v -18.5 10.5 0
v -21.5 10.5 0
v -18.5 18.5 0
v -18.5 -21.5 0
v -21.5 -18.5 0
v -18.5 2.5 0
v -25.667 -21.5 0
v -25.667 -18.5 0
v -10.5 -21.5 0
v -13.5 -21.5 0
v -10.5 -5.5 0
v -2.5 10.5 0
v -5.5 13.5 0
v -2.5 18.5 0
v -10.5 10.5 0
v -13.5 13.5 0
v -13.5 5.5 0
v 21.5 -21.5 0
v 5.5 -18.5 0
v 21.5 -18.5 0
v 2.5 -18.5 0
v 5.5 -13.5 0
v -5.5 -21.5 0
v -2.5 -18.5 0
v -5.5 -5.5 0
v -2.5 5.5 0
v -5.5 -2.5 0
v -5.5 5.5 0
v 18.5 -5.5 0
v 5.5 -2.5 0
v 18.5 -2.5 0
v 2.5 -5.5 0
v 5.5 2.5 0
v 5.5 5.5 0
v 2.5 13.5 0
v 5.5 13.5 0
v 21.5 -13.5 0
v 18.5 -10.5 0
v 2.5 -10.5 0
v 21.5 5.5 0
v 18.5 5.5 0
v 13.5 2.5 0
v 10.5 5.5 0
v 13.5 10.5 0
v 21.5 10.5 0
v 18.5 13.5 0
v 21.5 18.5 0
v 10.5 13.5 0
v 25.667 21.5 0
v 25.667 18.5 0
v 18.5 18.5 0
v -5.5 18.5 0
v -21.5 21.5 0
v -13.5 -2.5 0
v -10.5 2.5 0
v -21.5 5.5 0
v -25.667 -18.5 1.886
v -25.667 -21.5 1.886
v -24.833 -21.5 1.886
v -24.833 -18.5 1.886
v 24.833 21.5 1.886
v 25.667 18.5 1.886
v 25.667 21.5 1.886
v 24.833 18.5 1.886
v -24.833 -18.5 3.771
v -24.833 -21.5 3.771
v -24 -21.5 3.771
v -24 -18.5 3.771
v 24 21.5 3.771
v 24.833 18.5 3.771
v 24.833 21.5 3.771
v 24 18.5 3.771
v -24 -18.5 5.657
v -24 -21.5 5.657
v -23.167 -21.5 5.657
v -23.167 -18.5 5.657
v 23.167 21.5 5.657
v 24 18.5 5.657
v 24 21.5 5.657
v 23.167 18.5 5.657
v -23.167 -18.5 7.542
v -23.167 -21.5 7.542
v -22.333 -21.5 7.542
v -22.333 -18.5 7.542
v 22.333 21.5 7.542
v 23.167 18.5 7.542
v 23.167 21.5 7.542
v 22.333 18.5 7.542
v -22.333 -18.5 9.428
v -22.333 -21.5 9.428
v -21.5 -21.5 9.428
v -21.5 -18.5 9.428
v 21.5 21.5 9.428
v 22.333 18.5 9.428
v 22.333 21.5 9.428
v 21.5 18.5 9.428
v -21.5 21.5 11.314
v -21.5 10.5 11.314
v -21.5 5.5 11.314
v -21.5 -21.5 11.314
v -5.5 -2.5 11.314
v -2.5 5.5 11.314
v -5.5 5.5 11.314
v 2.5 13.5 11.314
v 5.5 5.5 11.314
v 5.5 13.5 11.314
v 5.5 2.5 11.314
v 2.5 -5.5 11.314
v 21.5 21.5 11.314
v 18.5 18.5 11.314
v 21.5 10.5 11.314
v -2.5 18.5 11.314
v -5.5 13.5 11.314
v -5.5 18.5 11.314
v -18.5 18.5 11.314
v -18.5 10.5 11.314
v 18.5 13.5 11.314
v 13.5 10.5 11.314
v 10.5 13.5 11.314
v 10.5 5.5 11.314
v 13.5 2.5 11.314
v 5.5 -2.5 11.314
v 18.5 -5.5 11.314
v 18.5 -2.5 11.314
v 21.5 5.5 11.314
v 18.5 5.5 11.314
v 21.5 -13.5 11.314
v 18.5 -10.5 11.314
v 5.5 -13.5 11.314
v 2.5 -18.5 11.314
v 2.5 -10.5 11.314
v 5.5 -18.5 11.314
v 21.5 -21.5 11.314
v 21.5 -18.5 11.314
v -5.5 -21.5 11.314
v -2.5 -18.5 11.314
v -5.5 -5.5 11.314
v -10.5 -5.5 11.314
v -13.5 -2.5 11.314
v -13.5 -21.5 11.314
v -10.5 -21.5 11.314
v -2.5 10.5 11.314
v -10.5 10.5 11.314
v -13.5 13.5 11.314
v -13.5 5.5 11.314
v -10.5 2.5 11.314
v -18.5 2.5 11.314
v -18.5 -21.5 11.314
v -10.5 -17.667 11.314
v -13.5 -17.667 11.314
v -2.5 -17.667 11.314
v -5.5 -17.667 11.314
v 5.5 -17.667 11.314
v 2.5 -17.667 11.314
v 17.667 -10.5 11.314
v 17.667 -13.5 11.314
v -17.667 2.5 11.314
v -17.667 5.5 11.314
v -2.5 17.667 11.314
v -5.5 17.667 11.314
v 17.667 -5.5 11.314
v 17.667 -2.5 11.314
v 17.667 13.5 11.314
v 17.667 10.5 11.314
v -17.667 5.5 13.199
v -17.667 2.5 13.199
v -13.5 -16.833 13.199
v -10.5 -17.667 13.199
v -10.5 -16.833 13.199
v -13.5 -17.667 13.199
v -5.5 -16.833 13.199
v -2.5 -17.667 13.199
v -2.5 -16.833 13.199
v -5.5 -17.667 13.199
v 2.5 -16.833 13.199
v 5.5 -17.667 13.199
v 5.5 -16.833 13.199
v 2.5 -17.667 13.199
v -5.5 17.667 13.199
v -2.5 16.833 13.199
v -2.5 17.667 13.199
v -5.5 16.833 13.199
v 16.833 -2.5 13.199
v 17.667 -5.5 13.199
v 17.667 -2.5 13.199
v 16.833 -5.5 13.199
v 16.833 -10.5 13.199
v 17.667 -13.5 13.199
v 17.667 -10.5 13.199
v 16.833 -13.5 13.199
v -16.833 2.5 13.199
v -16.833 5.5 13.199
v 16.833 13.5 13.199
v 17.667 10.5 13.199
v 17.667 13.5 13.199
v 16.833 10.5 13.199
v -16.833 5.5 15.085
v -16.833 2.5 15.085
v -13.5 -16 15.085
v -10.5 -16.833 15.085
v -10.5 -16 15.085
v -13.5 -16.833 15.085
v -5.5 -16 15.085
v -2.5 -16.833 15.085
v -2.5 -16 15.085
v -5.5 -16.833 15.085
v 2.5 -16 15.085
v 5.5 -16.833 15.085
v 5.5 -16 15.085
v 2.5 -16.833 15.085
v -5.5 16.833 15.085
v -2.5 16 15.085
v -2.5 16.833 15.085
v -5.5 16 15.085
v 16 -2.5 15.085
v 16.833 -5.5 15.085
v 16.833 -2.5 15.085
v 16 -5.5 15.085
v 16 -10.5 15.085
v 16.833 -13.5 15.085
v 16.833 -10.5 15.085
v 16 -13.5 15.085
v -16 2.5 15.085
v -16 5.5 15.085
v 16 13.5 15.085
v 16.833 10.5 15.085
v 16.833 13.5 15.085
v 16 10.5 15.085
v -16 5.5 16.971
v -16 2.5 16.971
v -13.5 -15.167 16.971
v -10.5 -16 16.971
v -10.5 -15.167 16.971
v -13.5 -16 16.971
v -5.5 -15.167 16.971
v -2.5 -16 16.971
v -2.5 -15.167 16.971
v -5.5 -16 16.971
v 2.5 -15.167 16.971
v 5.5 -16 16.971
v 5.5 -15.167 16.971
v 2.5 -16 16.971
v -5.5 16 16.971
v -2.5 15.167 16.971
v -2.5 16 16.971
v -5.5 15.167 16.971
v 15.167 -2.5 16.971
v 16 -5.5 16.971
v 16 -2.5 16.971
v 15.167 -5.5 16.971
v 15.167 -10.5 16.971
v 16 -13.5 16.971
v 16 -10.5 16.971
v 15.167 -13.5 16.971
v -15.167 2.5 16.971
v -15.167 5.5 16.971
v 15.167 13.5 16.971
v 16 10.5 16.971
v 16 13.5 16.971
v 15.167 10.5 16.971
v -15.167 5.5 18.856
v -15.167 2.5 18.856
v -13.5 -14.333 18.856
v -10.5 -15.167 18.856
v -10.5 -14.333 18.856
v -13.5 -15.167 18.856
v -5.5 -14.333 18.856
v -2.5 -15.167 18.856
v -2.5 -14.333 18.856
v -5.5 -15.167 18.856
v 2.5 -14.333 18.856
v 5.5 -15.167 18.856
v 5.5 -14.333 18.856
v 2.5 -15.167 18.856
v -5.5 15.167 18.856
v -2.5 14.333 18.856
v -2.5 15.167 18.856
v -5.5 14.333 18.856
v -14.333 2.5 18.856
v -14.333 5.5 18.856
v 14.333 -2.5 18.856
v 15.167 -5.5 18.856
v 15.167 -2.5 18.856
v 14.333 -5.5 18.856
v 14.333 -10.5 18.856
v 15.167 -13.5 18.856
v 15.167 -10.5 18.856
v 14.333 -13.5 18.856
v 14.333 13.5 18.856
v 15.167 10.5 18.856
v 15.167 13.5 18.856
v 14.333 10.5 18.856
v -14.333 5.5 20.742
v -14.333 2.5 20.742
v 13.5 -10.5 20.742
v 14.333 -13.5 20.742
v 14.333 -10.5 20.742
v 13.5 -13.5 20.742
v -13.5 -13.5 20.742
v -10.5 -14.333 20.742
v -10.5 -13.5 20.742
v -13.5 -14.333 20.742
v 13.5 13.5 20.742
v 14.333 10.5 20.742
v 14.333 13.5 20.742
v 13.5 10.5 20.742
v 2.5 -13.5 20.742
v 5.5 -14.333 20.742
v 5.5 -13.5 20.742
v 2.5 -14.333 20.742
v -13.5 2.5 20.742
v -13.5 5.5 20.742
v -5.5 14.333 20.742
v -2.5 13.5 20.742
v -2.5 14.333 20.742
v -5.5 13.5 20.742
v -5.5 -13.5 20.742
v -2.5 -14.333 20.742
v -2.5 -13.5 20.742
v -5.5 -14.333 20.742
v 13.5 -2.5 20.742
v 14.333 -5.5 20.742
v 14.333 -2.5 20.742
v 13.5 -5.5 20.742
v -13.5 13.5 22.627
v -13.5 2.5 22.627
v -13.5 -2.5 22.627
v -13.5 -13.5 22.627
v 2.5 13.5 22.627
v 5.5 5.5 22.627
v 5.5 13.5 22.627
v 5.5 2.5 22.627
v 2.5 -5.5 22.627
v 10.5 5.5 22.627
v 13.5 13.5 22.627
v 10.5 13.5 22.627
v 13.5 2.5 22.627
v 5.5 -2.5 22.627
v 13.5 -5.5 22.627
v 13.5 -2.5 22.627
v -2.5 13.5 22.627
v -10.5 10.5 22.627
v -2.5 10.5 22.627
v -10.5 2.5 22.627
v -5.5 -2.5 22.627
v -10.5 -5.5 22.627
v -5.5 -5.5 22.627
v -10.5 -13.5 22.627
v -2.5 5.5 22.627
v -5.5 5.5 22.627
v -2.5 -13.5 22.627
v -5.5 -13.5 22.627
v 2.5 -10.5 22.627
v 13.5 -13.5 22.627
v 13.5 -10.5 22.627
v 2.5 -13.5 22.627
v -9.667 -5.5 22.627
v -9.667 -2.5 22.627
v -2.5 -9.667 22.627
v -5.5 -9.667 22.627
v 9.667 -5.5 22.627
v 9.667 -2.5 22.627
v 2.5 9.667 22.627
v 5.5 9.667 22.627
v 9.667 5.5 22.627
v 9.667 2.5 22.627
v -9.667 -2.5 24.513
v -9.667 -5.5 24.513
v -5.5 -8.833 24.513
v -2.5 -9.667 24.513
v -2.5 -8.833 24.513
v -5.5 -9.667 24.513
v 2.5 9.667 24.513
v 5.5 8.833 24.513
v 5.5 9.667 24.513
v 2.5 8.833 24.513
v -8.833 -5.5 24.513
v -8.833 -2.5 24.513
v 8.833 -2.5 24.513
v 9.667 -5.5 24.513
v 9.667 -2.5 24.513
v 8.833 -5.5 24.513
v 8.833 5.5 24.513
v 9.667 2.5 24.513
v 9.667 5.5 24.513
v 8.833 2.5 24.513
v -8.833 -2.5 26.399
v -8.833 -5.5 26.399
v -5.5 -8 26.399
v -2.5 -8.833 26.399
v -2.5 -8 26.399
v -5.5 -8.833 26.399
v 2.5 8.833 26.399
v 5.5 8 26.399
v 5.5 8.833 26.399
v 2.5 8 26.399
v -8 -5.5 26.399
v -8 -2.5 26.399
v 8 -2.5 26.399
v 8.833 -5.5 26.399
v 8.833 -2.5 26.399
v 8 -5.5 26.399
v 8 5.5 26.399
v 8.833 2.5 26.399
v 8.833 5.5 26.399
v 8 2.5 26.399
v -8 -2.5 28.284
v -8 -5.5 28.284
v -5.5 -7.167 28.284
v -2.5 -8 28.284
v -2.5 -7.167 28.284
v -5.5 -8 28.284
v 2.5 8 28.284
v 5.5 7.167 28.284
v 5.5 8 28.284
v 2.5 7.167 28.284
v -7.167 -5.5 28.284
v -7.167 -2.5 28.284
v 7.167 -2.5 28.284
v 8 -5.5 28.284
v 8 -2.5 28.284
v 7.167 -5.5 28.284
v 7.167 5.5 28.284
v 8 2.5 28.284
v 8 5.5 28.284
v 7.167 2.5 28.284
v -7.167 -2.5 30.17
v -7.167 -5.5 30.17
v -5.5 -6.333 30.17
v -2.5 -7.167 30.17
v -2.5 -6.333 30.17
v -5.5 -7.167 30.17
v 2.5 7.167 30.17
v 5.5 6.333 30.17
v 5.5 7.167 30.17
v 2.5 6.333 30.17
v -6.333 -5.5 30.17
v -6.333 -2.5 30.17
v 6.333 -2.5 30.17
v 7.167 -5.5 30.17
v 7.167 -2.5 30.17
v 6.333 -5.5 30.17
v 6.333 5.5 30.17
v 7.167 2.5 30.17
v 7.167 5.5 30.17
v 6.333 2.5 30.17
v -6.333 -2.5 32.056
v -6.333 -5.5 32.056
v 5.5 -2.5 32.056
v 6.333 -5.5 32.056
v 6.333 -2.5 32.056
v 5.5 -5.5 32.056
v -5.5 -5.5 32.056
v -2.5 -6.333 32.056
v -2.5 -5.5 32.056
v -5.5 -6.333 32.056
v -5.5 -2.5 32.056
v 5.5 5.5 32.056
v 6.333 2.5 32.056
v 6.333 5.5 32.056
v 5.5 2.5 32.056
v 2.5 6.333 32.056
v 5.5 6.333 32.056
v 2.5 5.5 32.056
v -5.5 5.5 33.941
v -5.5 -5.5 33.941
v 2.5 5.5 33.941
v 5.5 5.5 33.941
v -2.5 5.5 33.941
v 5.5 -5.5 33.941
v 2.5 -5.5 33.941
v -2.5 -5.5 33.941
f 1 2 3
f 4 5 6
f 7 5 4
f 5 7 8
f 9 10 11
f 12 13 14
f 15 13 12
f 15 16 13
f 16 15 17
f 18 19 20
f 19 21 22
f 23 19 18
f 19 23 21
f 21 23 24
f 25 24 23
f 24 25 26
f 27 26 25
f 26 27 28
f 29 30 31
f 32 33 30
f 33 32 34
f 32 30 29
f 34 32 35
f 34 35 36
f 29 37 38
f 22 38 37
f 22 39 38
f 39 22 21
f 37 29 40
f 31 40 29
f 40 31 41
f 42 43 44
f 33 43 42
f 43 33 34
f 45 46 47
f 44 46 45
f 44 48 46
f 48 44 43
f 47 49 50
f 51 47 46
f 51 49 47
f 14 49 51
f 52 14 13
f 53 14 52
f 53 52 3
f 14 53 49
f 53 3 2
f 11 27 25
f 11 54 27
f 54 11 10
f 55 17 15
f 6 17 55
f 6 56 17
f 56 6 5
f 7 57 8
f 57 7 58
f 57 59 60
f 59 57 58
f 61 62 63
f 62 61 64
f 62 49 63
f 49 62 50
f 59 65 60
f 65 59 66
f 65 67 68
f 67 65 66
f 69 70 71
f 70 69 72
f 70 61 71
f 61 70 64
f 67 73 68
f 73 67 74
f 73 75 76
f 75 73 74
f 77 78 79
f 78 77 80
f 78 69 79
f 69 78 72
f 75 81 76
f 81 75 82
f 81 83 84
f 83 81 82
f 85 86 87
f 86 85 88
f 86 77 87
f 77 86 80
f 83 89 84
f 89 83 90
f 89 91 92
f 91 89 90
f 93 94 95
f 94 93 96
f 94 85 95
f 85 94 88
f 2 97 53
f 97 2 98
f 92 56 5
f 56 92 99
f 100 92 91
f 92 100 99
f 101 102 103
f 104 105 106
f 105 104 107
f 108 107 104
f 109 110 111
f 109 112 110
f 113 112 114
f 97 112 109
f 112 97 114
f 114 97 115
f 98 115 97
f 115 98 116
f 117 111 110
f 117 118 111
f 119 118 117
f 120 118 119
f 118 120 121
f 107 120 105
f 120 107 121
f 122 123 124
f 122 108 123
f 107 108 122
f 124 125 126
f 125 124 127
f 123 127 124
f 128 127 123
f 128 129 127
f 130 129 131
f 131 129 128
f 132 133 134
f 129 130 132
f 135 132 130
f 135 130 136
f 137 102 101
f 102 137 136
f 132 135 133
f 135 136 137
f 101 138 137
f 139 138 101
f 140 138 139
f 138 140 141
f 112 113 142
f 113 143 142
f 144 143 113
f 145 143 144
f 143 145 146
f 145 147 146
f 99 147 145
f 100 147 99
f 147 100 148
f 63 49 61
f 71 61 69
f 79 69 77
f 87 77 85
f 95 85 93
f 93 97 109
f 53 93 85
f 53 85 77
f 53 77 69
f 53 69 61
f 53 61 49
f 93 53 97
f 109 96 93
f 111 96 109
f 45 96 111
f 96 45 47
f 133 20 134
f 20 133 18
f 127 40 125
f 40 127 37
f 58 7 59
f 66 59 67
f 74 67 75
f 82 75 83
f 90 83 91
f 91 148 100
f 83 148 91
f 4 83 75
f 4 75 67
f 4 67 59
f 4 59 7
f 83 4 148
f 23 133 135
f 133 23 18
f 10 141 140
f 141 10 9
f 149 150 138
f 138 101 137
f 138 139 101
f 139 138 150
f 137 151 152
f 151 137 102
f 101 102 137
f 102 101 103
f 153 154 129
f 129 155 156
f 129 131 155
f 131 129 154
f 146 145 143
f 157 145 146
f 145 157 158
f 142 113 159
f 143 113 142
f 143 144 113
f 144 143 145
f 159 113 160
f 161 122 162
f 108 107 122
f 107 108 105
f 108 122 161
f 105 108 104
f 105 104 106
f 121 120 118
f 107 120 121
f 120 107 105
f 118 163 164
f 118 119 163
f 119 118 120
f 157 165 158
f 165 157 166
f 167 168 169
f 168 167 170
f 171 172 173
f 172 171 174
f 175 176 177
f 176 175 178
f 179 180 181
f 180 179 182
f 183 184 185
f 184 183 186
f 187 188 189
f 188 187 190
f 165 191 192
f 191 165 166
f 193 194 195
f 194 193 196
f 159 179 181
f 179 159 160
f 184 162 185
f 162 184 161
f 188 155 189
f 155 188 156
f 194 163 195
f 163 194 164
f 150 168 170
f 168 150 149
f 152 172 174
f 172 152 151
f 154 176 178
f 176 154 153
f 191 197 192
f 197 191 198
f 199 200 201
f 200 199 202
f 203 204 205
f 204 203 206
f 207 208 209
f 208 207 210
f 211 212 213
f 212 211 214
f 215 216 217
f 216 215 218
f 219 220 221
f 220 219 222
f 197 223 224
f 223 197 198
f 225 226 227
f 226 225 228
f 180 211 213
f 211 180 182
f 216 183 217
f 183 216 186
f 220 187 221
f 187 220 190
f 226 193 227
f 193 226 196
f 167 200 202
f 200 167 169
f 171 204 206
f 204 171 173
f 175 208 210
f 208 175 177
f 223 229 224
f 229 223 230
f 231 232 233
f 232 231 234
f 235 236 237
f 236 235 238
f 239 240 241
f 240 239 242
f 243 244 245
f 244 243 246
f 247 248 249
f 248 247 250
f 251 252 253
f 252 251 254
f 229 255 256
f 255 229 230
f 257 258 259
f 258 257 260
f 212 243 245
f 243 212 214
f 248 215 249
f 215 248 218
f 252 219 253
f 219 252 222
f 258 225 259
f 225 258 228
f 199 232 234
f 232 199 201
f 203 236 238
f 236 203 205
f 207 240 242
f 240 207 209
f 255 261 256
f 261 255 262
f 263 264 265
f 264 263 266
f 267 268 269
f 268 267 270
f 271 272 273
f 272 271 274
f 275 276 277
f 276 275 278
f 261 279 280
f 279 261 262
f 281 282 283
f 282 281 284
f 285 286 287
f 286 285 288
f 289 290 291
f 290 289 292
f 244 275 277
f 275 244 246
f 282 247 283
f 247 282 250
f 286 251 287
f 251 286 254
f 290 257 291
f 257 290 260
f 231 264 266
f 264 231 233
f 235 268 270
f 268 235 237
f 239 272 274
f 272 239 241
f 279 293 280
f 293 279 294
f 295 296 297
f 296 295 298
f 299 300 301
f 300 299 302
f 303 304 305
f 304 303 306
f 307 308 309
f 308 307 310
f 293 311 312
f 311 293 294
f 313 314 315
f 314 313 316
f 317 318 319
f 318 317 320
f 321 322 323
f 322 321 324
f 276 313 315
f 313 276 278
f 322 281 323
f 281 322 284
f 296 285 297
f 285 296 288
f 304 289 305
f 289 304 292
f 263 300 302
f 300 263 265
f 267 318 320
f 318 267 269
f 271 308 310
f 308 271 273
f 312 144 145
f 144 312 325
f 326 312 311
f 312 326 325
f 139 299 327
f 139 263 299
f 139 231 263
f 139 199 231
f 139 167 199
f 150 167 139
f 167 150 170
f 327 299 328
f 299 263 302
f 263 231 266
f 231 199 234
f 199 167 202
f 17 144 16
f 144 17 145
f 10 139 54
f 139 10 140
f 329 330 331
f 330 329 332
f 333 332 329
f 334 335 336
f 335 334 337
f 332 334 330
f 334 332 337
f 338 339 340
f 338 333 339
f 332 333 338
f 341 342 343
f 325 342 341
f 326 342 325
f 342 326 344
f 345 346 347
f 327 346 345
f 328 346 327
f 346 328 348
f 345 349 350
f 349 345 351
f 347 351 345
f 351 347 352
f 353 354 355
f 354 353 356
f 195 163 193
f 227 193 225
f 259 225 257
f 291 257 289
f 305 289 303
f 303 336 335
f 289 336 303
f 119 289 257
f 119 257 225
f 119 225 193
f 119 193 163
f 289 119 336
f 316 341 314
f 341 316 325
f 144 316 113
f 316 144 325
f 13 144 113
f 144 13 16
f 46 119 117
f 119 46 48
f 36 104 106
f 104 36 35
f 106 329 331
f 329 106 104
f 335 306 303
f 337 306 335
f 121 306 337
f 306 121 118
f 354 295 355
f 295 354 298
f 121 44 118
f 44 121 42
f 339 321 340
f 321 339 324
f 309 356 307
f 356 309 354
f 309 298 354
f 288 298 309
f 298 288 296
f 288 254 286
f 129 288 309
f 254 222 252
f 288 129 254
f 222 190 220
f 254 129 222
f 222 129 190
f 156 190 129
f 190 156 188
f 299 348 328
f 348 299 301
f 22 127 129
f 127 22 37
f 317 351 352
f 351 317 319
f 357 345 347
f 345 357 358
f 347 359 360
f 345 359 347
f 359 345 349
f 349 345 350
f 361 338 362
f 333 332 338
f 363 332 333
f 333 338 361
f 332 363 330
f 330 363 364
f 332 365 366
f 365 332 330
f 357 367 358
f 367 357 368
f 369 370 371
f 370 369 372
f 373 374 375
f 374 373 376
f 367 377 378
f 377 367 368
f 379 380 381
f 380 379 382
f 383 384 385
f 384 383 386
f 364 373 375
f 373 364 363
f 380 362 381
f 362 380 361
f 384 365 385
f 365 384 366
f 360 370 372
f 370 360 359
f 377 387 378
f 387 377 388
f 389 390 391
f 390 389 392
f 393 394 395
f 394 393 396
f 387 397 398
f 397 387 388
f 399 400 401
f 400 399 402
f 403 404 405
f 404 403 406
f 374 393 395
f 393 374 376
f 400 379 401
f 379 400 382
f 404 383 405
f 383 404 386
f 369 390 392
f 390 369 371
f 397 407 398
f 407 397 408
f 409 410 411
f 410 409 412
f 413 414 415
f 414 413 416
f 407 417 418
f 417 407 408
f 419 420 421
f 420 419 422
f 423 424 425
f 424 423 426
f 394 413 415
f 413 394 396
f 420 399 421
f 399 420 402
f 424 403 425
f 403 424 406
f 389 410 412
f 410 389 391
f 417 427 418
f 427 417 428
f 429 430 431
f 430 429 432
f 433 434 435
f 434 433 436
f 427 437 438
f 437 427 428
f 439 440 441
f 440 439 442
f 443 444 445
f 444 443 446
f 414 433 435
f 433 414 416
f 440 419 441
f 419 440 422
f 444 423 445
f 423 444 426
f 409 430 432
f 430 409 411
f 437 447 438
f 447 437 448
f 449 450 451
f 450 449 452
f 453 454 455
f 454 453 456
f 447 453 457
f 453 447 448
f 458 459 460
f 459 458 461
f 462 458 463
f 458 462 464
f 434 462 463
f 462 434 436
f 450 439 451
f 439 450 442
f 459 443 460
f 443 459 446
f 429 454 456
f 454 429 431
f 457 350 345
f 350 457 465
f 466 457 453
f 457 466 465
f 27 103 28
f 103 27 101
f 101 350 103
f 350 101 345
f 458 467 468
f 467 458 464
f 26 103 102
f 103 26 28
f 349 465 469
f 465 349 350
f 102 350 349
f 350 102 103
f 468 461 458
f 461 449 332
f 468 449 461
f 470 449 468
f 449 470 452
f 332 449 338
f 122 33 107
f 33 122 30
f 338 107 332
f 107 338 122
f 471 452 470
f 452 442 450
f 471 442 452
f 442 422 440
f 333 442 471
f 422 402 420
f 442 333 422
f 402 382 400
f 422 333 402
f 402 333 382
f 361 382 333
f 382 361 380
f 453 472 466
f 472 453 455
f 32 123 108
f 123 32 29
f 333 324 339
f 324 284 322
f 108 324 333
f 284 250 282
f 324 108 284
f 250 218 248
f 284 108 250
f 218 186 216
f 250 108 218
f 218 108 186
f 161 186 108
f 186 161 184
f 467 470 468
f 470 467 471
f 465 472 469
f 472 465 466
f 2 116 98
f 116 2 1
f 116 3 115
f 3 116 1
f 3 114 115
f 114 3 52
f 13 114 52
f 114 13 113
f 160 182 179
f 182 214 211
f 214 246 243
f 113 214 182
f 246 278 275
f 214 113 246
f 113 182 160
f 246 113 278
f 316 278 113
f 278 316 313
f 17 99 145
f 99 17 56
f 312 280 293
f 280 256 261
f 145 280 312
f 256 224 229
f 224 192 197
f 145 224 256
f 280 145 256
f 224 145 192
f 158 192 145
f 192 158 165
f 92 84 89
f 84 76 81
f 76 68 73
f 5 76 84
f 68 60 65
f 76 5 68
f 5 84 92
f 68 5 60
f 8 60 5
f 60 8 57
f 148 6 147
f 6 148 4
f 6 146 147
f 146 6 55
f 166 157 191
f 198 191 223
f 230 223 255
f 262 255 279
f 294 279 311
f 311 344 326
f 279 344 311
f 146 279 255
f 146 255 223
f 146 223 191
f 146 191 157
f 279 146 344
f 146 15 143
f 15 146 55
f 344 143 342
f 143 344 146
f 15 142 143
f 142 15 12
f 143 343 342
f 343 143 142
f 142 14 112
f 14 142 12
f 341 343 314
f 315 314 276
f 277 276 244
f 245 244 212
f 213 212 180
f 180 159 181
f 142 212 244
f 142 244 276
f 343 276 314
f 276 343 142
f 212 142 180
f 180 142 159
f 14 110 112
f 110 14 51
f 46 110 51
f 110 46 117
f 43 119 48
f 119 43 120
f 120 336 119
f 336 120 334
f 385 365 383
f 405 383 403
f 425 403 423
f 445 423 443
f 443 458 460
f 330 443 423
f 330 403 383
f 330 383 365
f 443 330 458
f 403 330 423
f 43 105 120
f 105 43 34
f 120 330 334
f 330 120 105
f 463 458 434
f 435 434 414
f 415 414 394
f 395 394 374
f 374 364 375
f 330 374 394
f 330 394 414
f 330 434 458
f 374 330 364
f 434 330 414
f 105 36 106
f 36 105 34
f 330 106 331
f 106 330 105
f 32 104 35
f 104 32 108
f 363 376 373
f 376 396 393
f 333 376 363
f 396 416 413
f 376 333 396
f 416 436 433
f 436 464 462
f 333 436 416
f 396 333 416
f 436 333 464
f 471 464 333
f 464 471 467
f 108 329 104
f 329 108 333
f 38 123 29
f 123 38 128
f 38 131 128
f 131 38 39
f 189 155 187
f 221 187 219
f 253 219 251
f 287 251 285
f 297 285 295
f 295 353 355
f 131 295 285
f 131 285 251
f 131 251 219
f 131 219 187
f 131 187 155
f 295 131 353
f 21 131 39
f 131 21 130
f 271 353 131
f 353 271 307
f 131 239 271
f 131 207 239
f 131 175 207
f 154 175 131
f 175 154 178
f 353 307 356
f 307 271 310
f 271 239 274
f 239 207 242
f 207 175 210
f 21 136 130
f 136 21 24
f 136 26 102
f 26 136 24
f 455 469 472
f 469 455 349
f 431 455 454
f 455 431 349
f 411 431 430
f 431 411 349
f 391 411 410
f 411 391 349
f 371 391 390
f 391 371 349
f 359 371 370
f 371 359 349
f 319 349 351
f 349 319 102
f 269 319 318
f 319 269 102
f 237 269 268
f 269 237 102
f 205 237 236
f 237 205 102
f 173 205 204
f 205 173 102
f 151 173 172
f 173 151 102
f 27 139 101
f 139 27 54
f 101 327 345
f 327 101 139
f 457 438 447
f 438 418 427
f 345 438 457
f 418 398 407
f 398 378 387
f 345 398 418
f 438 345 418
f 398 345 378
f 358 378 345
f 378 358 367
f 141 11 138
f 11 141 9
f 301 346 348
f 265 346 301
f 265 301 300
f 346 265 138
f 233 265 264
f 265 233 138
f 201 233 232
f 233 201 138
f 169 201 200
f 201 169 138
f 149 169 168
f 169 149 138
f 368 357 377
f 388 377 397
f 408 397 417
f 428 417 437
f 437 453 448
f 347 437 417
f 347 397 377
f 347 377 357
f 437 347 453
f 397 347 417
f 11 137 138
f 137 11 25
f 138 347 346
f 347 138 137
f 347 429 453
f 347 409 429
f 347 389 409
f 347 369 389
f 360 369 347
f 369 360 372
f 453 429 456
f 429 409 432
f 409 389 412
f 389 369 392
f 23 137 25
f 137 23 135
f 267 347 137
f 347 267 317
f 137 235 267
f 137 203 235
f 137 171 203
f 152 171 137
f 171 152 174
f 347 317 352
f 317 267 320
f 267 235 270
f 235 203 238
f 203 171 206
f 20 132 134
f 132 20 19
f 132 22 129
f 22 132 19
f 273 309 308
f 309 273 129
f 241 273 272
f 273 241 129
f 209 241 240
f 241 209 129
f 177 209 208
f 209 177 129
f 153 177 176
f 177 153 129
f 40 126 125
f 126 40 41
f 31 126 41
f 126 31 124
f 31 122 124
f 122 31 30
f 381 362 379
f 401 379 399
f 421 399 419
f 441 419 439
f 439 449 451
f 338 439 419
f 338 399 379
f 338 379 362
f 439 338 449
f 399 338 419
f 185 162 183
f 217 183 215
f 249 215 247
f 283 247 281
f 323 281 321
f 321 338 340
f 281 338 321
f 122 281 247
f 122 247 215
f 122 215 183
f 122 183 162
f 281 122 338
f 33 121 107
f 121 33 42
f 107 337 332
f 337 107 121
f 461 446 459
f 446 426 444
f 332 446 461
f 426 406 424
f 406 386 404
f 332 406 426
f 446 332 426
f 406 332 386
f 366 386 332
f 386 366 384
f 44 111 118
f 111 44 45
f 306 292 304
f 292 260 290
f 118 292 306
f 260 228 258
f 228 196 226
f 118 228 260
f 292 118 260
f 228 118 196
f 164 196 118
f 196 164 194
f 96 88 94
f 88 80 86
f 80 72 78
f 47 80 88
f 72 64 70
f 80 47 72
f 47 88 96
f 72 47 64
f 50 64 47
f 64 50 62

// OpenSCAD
// This is OpenSCAD a programming language alot of engineers use to make 3D objects to fit specific accurate sizes etc.
// Change the variables to generate different
// mazes


maze_rows = 6;
block_width = 8;
stairs_width = 5;

// draw a line between point [x1, y1] and [x2, y2].
module line(point1, point2, width = 1, cap_round = true) {
    angle = 90 - atan((point2[1] - point1[1]) / (point2[0] - point1[0]));
    offset_x = 0.5 * width * cos(angle);
    offset_y = 0.5 * width * sin(angle);

    offset1 = [-offset_x, offset_y];
    offset2 = [offset_x, -offset_y];

    if(cap_round) {
        translate(point1) rotate(45) circle(d = width * sqrt(2), $fn = 4);
        translate(point2) rotate(45) circle(d = width * sqrt(2), $fn = 4);
    }

    polygon(points=[
        point1 + offset1, point2 + offset1,  
        point2 + offset2, point1 + offset2
    ]);
}

// Constants for wall types

NO_WALL = 0;       
UPPER_WALL = 1;    
RIGHT_WALL = 2;    
UPPER_RIGHT_WALL = 3; 

function block_data(x, y, wall_type, visited) = [x, y, wall_type, visited];
function get_x(block_data) = block_data[0];
function get_y(block_data) = block_data[1];
function get_wall_type(block_data) = block_data[2];

module draw_block(wall_type, block_width, wall_thickness) {
    if(wall_type == UPPER_WALL || wall_type == UPPER_RIGHT_WALL) {
        // draw a upper wall
        line(
            [0, block_width], [block_width, block_width], wall_thickness
        ); 
    }
    
    if(wall_type == RIGHT_WALL || wall_type == UPPER_RIGHT_WALL) {
        // draw a right wall
        line(
            [block_width, block_width], [block_width, 0], wall_thickness
        ); 
    }
}

module draw_maze(rows, columns, blocks, block_width, wall_thickness) {
    for(block = blocks) {
        // move a block to a right position.
        translate([get_x(block) - 1, get_y(block) - 1] * block_width) 
            draw_block(
                get_wall_type(block), 
                block_width, 
                wall_thickness
            );
    }

    // the lowermost wall
    line([0, 0], [block_width * columns, 0], 
         wall_thickness);
    // the leftmost wall
    line([0, block_width], [0, block_width * rows], 
         wall_thickness);
} 

// create a starting maze for being visited later.
function starting_maze(rows, columns) =  [
    for(y = [1:rows]) 
        for(x = [1:columns]) 
            block_data(
                x, y, 
                // all blocks have upper and right walls except the exit
                y == rows && x == columns ? UPPER_WALL : UPPER_RIGHT_WALL, 
                // unvisited
                false 
            )
];

// find out the index of a block with the position (x, y)
function indexOf(x, y, maze, i = 0) =
    i > len(maze) ? -1 : (
        [get_x(maze[i]), get_y(maze[i])] == [x, y] ? i : 
            indexOf(x, y, maze, i + 1)
    );

// is (x, y) visited?
function visited(x, y, maze) = maze[indexOf(x, y, maze)][3];

// is (x, y) visitable?
function visitable(x, y, maze, rows, columns) = 
    y > 0 && y <= rows &&     // y bound
    x > 0 && x <= columns &&  // x bound
    !visited(x, y, maze);     // unvisited

// setting (x, y) as being visited
function set_visited(x, y, maze) = [
    for(b = maze) 
        [x, y] == [get_x(b), get_y(b)] ? 
            [x, y, get_wall_type(b), true] : b
];
    
// 0（right）、1（upper）、2（left）、3（down）
function rand_dirs() =
    [
        [0, 1, 2, 3],
        [0, 1, 3, 2],
        [0, 2, 1, 3],
        [0, 2, 3, 1],
        [0, 3, 1, 2],
        [0, 3, 2, 1],
        [1, 0, 2, 3],
        [1, 0, 3, 2],
        [1, 2, 0, 3],
        [1, 2, 3, 0],
        [1, 3, 0, 2],
        [1, 3, 2, 0],
        [2, 0, 1, 3],
        [2, 0, 3, 1],
        [2, 1, 0, 3],
        [2, 1, 3, 0],
        [2, 3, 0, 1],
        [2, 3, 1, 0],
        [3, 0, 1, 2],
        [3, 0, 2, 1],
        [3, 1, 0, 2],
        [3, 1, 2, 0],
        [3, 2, 0, 1],
        [3, 2, 1, 0]
    ][round(rands(0, 24, 1)[0])]; 

// get x value by dir
function next_x(x, dir) = x + [1, 0, -1, 0][dir];
// get y value by dir
function next_y(y, dir) = y + [0, 1, 0, -1][dir];

// go right and carve the right wall
function go_right_from(x, y, maze) = [
    for(b = maze) [get_x(b), get_y(b)] == [x, y] ? (
        get_wall_type(b) == UPPER_RIGHT_WALL ? 
            [x, y, UPPER_WALL, visited(x, y, maze)] : 
            [x, y, NO_WALL, visited(x, y, maze)]
        
    ) : b
]; 

// go up and carve the upper wall
function go_up_from(x, y, maze) = [
    for(b = maze) [get_x(b), get_y(b)] == [x, y] ? (
        get_wall_type(b) == UPPER_RIGHT_WALL ? 
            [x, y, RIGHT_WALL, visited(x, y, maze)] :  
            [x, y, NO_WALL, visited(x, y, maze)]
        
    ) : b
]; 

// go left and carve the right wall of the left block
function go_left_from(x, y, maze) = [
    for(b = maze) [get_x(b), get_y(b)] == [x - 1, y] ? (
        get_wall_type(b) == UPPER_RIGHT_WALL ? 
            [x - 1, y, UPPER_WALL, visited(x - 1, y, maze)] : 
            [x - 1, y, NO_WALL, visited(x - 1, y, maze)]
    ) : b
]; 

// go down and carve the upper wall of the down block
function go_down_from(x, y, maze) = [
    for(b = maze) [get_x(b), get_y(b)] == [x, y - 1] ? (
        get_wall_type(b) == UPPER_RIGHT_WALL ? 
            [x, y - 1, RIGHT_WALL, visited(x, y - 1, maze)] : 
            [x, y - 1, NO_WALL, visited(x, y - 1, maze)]
    ) : b
]; 

// 0（right）、1（upper）、2（left）、3（down）
function try_block(dir, x, y, maze, rows, columns) =
    dir == 0 ? go_right_from(x, y, maze) : (
        dir == 1 ? go_up_from(x, y, maze) : (
            dir == 2 ? go_left_from(x, y, maze) : 
                 go_down_from(x, y, maze)   // 這時 dir 一定是 3
            
        ) 
    );


// find out visitable dirs from (x, y)
function visitable_dirs_from(x, y, maze, rows, columns) = [
    for(dir = [0, 1, 2, 3]) 
        if(visitable(next_x(x, dir), next_y(y, dir), maze, maze_rows, columns)) 
            dir
];  
    
// go maze from (x, y)
function go_maze(x, y, maze, rows, columns) = 
    //  have visitable dirs?
    len(visitable_dirs_from(x, y, maze, rows, columns)) == 0 ? 
        set_visited(x, y, maze)      // road closed
        : walk_around_from(          
            x, y, 
            rand_dirs(),             
            set_visited(x, y, maze), 
            rows, columns
        );

// try four directions
function walk_around_from(x, y, dirs, maze, rows, columns, i = 4) =
    // all done?
    i > 0 ? 
        // not yet
        walk_around_from(x, y, dirs, 
            // try one direction
            try_routes_from(x, y, dirs[4 - i], maze, rows, columns),  
            , rows, columns, 
            i - 1) 
        : maze;
        
function try_routes_from(x, y, dir, maze, rows, columns) = 
    // is the dir visitable?
    visitable(next_x(x, dir), next_y(y, dir), maze, rows, columns) ?     
        // try the block 
        go_maze(
            next_x(x, dir), next_y(y, dir), 
            try_block(dir, x, y, maze, rows, columns),
            rows, columns
        ) 
        // road closed so return maze directly
        : maze;   

module pyramid_with_stairs(base_width, stairs_width, rows) {
    height = base_width * sqrt(2) / 2;

    module floor(i) {
        base_w = base_width - (base_width / rows) * (i - 1) + stairs_width;
        floor_h = height / rows * 2;
                
        stairsteps = rows;
        staircase_h = floor_h / stairsteps;
        staircase_w = stairs_width / stairsteps * 2;
        
        translate([0, 0, floor_h / 2 * (i - 1)]) 
            for(j = [1:stairsteps]) {
                square_w = base_w - j * staircase_w;
                translate([0, 0, staircase_h * (j - 1)])  
                    linear_extrude(staircase_h) 
                        square([square_w, square_w], center = true);
            }
    }
    
    for(i = [1:2:rows - 1]) {
        floor(i);
    }
}

module pyramidal_staircase_maze(maze_rows, block_width, stairs_width) {
    maze_blocks = go_maze(
        1, 1,   // starting point
        starting_maze(maze_rows, maze_rows),  
        maze_rows, maze_rows
    ); 
    
    intersection() {
        pyramid_with_stairs(
            maze_rows * block_width, stairs_width, maze_rows);

        linear_extrude(maze_rows * block_width * sqrt(2) / 2)  difference() {
            
            square([block_width * maze_rows + stairs_width, block_width * maze_rows + stairs_width], center = true);
            
            translate([-(maze_rows * block_width) / 2, -(maze_rows * block_width) / 2, 0]) 

            
            draw_maze(
                maze_rows, 
                maze_rows, 
                maze_blocks, 
                block_width, 
                stairs_width
            );
        }
    }
}

pyramidal_staircase_maze(maze_rows, block_width, stairs_width);
